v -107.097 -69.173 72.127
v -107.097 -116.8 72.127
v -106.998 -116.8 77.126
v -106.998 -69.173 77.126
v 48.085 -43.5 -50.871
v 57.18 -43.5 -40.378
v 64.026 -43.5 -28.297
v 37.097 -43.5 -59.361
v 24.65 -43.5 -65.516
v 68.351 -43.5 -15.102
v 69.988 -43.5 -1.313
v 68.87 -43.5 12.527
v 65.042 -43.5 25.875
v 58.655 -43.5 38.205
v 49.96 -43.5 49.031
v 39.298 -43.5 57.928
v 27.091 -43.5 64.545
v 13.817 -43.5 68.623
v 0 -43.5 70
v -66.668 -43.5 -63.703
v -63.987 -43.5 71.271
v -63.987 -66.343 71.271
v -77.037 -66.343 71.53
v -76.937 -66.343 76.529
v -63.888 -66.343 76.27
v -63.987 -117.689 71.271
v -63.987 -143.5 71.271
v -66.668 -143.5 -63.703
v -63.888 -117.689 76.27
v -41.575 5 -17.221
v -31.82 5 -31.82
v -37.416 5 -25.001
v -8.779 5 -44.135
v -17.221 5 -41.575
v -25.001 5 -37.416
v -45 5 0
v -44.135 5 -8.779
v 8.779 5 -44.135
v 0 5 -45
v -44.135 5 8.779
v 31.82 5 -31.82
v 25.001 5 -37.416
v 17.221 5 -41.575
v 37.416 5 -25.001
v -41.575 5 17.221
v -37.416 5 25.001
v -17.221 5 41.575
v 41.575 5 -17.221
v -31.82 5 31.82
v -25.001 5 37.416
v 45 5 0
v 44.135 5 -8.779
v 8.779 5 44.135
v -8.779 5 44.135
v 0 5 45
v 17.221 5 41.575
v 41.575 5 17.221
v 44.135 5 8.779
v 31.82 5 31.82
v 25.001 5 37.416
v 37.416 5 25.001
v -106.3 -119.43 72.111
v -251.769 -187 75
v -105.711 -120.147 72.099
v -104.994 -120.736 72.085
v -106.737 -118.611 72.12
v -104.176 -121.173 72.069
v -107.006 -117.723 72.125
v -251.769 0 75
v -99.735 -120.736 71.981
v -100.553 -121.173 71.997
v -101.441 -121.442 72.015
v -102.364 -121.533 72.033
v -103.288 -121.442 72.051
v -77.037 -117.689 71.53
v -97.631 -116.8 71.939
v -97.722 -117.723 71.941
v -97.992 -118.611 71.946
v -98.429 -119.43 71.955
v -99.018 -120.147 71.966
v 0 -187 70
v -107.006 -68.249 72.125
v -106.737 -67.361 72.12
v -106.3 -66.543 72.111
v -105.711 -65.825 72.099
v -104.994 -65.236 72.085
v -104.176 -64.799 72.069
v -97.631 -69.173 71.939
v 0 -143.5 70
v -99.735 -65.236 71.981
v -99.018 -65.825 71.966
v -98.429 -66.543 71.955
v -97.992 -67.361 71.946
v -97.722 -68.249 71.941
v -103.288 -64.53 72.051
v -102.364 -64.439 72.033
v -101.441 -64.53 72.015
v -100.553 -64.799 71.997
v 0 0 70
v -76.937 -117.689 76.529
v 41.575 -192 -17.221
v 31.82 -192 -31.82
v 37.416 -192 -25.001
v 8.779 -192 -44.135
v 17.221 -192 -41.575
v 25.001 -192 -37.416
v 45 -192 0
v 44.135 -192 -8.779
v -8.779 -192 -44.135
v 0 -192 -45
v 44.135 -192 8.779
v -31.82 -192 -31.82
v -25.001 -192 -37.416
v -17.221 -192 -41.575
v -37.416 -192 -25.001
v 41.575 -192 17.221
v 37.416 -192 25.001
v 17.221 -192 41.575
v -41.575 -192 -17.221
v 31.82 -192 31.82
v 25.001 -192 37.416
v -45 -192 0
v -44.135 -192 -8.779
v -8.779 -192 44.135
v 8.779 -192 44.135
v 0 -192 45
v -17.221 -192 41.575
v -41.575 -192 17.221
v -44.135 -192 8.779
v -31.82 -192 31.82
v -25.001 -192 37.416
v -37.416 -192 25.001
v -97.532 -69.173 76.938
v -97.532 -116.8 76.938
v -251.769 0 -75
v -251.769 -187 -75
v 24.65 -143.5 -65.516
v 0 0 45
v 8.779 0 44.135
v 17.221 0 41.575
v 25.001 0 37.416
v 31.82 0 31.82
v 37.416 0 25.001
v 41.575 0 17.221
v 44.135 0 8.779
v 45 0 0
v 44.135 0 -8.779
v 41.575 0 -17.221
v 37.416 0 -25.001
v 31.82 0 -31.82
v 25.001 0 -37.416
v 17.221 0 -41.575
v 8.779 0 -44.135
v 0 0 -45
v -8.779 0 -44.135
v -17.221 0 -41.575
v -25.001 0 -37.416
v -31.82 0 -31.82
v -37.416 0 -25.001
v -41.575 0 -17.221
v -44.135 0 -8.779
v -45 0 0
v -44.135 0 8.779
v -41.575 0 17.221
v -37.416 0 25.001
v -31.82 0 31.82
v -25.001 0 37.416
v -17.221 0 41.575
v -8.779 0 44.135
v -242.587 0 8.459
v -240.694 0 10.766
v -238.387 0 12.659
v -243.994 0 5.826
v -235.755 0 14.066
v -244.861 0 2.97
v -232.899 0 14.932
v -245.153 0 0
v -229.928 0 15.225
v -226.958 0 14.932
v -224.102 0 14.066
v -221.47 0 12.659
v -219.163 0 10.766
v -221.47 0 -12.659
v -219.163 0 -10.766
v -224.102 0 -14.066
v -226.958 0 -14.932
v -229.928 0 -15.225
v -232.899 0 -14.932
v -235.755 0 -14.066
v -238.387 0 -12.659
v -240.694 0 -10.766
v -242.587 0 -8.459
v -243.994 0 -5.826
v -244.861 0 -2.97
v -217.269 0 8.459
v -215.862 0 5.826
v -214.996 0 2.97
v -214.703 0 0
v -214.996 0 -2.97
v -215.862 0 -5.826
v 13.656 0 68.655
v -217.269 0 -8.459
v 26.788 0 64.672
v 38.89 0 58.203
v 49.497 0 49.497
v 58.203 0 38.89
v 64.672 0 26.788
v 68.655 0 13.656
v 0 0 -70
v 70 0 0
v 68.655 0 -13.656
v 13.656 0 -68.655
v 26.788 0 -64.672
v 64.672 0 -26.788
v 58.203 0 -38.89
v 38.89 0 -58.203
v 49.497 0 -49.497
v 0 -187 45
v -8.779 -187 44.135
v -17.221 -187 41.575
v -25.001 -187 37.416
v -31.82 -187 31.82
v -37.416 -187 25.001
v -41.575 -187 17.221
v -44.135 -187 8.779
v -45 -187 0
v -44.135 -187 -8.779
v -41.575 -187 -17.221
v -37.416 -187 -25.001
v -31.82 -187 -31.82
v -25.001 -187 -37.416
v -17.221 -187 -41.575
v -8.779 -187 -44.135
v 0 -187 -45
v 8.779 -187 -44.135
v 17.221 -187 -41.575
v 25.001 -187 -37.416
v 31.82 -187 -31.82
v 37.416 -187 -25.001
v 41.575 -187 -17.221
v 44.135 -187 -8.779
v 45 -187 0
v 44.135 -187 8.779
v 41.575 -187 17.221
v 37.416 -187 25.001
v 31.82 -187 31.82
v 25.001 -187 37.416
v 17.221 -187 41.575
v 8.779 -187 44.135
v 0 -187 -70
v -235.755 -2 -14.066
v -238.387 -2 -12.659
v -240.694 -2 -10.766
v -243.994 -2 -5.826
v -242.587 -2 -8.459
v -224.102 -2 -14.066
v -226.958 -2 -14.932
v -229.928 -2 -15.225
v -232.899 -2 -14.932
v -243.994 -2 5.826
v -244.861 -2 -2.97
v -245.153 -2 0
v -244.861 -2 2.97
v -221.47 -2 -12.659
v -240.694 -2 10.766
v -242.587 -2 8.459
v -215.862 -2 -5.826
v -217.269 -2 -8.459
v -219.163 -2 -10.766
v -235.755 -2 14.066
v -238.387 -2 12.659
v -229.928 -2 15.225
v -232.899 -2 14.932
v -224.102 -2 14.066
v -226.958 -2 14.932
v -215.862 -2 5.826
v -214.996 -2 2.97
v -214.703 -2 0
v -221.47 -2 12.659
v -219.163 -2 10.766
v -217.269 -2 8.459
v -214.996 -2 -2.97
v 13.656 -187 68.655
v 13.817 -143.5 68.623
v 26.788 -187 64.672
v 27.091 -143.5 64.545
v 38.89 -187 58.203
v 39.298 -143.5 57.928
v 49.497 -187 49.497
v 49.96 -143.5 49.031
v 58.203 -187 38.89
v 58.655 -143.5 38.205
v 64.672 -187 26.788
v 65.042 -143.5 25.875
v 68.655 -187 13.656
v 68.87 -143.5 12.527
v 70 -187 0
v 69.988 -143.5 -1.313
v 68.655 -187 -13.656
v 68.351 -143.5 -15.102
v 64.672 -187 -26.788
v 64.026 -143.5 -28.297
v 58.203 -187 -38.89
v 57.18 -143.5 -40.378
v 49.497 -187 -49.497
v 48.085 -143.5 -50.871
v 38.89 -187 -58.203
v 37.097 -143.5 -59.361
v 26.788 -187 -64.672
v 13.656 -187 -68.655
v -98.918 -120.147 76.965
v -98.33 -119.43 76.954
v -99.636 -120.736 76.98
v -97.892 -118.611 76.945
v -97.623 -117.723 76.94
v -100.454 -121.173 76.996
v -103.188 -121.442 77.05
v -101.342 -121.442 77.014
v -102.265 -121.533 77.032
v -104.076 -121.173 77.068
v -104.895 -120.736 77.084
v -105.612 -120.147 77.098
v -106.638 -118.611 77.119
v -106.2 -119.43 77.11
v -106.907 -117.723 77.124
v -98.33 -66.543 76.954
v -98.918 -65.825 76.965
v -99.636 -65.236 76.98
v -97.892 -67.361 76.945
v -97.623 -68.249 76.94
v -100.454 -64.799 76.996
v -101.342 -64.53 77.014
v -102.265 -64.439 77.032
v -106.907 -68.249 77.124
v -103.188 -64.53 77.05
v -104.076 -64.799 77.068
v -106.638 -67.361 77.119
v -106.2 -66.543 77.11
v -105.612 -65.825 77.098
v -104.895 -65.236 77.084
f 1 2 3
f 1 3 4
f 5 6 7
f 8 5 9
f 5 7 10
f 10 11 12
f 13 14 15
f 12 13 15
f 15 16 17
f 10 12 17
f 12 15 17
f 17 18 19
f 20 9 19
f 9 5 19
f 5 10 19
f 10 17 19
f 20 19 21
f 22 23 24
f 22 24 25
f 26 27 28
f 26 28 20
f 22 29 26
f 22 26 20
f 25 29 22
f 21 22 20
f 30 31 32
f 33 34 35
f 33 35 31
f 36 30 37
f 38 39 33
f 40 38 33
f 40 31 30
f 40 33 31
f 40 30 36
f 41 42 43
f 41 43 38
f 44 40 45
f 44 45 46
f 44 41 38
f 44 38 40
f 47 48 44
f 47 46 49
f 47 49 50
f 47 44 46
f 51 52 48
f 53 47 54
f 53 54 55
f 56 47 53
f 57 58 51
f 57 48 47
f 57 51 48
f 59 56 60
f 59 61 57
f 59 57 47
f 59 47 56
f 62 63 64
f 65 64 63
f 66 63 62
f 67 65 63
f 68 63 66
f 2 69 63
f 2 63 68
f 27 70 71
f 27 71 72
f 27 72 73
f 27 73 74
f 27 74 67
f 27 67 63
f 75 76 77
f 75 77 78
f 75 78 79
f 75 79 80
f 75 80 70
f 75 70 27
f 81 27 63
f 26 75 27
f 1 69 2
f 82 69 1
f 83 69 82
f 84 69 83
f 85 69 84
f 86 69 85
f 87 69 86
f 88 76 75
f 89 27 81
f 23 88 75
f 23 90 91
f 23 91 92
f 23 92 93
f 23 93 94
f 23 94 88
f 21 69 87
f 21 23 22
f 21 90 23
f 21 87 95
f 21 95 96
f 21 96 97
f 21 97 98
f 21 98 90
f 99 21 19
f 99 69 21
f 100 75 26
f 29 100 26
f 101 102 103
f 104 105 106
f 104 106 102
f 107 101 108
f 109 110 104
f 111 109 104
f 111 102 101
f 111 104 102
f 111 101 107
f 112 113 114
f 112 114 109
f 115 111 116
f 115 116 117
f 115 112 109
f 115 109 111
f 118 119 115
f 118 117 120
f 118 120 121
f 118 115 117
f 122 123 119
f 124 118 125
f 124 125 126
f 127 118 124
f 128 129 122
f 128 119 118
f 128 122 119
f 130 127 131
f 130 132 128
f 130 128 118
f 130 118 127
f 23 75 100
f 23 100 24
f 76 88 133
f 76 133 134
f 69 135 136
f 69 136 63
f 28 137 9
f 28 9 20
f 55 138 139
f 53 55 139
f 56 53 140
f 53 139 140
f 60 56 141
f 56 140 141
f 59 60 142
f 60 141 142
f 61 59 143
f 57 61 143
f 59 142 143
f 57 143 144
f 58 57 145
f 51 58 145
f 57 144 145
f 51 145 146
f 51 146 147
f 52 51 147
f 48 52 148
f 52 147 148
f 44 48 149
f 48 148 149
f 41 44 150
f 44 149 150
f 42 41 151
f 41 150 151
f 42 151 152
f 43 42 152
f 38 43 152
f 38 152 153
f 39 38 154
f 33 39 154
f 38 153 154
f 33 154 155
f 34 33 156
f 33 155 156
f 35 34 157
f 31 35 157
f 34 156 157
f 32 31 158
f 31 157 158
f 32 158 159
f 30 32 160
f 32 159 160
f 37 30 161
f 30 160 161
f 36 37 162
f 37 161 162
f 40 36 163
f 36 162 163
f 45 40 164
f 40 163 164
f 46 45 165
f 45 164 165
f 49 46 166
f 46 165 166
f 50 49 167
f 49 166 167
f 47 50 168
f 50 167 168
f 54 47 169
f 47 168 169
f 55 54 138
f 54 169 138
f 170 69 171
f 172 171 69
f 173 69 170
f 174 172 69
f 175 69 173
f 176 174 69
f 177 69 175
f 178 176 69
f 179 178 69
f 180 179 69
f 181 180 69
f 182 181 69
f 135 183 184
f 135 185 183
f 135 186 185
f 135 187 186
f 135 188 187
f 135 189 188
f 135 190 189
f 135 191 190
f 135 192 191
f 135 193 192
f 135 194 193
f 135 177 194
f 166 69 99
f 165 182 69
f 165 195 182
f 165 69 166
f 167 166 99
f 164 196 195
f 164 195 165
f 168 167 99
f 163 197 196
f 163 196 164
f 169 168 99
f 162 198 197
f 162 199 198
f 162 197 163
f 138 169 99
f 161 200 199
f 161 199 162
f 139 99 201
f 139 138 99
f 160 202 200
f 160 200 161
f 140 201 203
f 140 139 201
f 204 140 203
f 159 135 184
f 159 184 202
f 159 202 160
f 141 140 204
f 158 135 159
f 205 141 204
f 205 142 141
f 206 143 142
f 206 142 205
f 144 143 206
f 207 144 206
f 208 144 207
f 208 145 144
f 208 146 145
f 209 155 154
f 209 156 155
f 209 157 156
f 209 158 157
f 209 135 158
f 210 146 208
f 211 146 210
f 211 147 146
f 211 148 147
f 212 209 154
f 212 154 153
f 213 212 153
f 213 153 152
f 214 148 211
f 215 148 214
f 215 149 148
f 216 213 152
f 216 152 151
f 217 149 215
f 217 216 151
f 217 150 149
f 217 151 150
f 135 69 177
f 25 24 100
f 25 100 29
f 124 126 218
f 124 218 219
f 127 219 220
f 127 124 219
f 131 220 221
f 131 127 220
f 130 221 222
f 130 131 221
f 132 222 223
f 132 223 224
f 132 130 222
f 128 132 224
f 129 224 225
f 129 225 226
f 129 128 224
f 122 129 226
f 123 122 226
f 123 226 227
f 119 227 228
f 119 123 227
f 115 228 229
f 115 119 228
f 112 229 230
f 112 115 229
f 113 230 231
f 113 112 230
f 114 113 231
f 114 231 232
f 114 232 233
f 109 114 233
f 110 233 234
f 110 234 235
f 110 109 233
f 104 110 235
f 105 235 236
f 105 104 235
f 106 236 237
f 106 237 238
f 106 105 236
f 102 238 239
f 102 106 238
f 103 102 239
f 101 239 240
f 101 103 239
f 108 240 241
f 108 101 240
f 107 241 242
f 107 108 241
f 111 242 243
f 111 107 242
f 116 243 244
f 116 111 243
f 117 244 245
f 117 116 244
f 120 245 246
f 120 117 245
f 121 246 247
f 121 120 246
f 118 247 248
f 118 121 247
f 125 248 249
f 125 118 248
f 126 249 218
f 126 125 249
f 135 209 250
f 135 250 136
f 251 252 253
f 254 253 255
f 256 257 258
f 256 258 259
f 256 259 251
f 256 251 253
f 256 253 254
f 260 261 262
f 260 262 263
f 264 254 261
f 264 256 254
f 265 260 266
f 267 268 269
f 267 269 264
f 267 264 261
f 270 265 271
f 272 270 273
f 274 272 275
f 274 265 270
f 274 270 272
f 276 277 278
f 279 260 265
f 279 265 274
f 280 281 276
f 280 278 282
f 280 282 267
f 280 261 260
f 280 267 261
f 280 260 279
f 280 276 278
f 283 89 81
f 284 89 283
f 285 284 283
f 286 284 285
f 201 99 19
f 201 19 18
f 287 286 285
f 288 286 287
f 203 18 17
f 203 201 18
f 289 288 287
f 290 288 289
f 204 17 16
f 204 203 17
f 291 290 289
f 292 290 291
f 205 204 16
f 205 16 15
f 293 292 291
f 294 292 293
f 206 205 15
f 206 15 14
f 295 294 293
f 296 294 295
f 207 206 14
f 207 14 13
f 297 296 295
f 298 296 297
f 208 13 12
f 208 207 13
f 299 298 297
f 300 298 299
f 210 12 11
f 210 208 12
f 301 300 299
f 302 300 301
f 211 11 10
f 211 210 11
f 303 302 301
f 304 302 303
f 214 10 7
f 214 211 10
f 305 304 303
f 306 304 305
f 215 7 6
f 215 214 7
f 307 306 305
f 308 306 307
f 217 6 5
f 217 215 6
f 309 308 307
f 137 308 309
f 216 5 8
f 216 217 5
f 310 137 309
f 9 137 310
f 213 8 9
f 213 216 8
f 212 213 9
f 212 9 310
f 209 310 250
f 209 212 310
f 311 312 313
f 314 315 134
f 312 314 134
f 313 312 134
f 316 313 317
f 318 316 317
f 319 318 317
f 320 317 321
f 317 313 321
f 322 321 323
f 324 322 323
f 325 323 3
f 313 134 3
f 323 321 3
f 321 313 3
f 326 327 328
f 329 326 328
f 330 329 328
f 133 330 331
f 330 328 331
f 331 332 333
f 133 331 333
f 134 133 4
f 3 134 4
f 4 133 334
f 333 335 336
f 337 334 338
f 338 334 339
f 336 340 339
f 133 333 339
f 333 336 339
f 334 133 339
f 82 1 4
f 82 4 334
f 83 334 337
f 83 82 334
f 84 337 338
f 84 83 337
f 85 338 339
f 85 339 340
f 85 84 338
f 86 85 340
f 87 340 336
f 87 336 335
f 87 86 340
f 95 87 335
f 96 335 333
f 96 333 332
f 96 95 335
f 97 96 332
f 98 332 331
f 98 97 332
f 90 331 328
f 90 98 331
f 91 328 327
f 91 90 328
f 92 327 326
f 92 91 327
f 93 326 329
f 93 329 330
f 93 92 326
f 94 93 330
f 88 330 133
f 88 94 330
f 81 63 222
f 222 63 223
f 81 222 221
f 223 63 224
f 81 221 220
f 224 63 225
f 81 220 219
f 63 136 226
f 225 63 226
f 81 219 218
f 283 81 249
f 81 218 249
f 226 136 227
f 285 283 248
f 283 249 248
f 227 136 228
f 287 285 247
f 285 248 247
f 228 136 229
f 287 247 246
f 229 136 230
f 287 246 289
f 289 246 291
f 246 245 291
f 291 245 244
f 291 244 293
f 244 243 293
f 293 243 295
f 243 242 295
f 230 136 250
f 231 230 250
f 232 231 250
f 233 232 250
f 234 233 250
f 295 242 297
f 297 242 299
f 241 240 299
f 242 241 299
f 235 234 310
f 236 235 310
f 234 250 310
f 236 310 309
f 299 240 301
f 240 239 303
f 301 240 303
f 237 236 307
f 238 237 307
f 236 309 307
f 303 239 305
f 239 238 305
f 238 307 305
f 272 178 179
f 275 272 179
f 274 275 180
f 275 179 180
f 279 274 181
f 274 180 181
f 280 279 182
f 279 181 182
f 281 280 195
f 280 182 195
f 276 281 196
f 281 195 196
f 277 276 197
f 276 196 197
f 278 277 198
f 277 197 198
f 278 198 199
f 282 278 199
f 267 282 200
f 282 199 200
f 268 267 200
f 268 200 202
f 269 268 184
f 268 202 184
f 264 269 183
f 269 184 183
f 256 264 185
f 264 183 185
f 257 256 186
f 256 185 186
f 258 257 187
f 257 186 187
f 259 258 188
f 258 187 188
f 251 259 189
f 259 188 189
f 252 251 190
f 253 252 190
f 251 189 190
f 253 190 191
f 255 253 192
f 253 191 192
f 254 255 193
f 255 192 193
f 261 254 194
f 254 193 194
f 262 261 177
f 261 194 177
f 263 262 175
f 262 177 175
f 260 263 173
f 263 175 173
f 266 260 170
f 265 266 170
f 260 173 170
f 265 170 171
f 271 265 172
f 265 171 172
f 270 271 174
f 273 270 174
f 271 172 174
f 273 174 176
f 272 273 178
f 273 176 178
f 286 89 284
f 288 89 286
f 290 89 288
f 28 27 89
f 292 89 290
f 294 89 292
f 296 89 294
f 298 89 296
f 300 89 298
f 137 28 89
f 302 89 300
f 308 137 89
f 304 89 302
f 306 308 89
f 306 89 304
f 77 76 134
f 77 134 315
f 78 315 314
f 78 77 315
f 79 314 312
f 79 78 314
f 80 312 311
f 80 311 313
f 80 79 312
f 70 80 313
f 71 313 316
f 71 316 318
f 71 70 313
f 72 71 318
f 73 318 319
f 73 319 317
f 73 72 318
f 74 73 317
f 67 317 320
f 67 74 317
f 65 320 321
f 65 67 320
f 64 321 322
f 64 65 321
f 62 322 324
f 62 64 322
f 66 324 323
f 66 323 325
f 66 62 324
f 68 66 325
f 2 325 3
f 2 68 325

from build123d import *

# Parameters (mm, degrees)
BOSS_EXTRUDE1_DEPTH = 187
CUT_EXTRUDE3_DEPTH  = 135
SKETCH3_W           = 208.90375788
SKETCH3_H           = 100
CUT_EXTRUDE4_DEPTH  = 175
SKETCH4_R           = 45
BOSS_EXTRUDE2_DEPTH = 5
BOSS_EXTRUDE3_START = 5
SKETCH5_R           = 45
BOSS_EXTRUDE3_DEPTH = 5
SKETCH6_W           = 13.051719475
SKETCH6_H           = 51.345683967
BOSS_EXTRUDE4_DEPTH = 5
BOSS_EXTRUDE5_DEPTH = 5
SKETCH8_R           = 15.225
CUT_EXTRUDE6_DEPTH  = 2


with BuildPart() as part:
    # Sketch1 → Boss-Extrude1 (new body)
    with BuildSketch(Plane(origin=(0, 0, 0), x_dir=(1, 0, 0), z_dir=(0, 1, 0))):
        with BuildLine():
            Line((0, 70), (-251.769125683, 75))
            Line((-251.769125683, 75), (-251.769125683, -75))
            Line((-251.769125683, -75), (0, -70))
            ThreePointArc((0, -70), (70, 0), (0, 70))
        make_face()
    extrude(amount=-BOSS_EXTRUDE1_DEPTH)

    # Sketch2 → Cut-Extrude3 (cut)
    with BuildSketch(Plane(origin=(1.38961445, 0, 69.972403001), x_dir=(0.9998028591480678, 0, -0.019855549333850253), z_dir=(0.019855549333850253, 0, 0.9998028591480679))):
        Polygon((-1.389888453, -43.5), (169.277022147, -43.5), (169.277022147, -143.5), (-1.389888453, -143.5), (-65.389888453, -143.5), (-65.389888453, -43.5), align=None)
    extrude(amount=-CUT_EXTRUDE3_DEPTH, mode=Mode.SUBTRACT)

    # Sketch3 → Cut-Extrude4 (cut)
    with BuildSketch(Plane(origin=(-1.29088471, 0, -65.000982984), x_dir=(0.9998028591480678, 0, -0.019855549333850163), z_dir=(0.019855549333850163, 0, 0.9998028591480679))):
        with Locations((39.061990487, -93.5)):
            Rectangle(SKETCH3_W, SKETCH3_H)
    extrude(amount=CUT_EXTRUDE4_DEPTH, mode=Mode.SUBTRACT)

    # Sketch4 → Boss-Extrude2 (add)
    with BuildSketch(Plane(origin=(0, 0, 0), x_dir=(1, 0, 0), z_dir=(0, 1, 0))):
        with Locations(Location((0, 0, 0), (0, 0, 270))):
            Circle(SKETCH4_R)
    extrude(amount=BOSS_EXTRUDE2_DEPTH)

    # Sketch5 → Boss-Extrude3 (add)
    with BuildSketch(Plane.XZ.offset(187).offset(BOSS_EXTRUDE3_START)):
        with Locations(Location((0, 0, 0), (0, 0, 90))):
            Circle(SKETCH5_R)
    extrude(amount=-BOSS_EXTRUDE3_DEPTH)

    # Sketch6 → Boss-Extrude4 (add)
    with BuildSketch(Plane(origin=(1.38961445, 0, 69.972403001), x_dir=(0.9998028591480678, 0, -0.019855549333850253), z_dir=(0.019855549333850253, 0, 0.9998028591480679))):
        with Locations((-71.915748191, -92.016210874)):
            Rectangle(SKETCH6_W, SKETCH6_H)
    extrude(amount=BOSS_EXTRUDE4_DEPTH)

    # Sketch7 → Boss-Extrude5 (add)
    with BuildSketch(Plane(origin=(1.38961445, 0, 69.972403001), x_dir=(0.9998028591480678, 0, -0.019855549333850253), z_dir=(0.019855549333850253, 0, 0.9998028591480679))):
        with BuildLine():
            Line((-108.508236533, -116.799531344), (-108.508236533, -69.172508895))
            ThreePointArc((-108.508236533, -69.172508895), (-103.774379298, -64.438651661), (-99.040522064, -69.172508895))
            Line((-99.040522064, -69.172508895), (-99.040522064, -116.799531344))
            ThreePointArc((-99.040522064, -116.799531344), (-103.774379298, -121.533388578), (-108.508236533, -116.799531344))
        make_face()
    extrude(amount=BOSS_EXTRUDE5_DEPTH)

    # Sketch8 → Cut-Extrude6 (cut)
    with BuildSketch(Plane(origin=(0, 0, 0), x_dir=(1, 0, 0), z_dir=(0, 1, 0))):
        with Locations(Location((-229.928260902, 0, 0), (0, 0, 270))):
            Circle(SKETCH8_R)
    extrude(amount=-CUT_EXTRUDE6_DEPTH, mode=Mode.SUBTRACT)


solid = part.part
